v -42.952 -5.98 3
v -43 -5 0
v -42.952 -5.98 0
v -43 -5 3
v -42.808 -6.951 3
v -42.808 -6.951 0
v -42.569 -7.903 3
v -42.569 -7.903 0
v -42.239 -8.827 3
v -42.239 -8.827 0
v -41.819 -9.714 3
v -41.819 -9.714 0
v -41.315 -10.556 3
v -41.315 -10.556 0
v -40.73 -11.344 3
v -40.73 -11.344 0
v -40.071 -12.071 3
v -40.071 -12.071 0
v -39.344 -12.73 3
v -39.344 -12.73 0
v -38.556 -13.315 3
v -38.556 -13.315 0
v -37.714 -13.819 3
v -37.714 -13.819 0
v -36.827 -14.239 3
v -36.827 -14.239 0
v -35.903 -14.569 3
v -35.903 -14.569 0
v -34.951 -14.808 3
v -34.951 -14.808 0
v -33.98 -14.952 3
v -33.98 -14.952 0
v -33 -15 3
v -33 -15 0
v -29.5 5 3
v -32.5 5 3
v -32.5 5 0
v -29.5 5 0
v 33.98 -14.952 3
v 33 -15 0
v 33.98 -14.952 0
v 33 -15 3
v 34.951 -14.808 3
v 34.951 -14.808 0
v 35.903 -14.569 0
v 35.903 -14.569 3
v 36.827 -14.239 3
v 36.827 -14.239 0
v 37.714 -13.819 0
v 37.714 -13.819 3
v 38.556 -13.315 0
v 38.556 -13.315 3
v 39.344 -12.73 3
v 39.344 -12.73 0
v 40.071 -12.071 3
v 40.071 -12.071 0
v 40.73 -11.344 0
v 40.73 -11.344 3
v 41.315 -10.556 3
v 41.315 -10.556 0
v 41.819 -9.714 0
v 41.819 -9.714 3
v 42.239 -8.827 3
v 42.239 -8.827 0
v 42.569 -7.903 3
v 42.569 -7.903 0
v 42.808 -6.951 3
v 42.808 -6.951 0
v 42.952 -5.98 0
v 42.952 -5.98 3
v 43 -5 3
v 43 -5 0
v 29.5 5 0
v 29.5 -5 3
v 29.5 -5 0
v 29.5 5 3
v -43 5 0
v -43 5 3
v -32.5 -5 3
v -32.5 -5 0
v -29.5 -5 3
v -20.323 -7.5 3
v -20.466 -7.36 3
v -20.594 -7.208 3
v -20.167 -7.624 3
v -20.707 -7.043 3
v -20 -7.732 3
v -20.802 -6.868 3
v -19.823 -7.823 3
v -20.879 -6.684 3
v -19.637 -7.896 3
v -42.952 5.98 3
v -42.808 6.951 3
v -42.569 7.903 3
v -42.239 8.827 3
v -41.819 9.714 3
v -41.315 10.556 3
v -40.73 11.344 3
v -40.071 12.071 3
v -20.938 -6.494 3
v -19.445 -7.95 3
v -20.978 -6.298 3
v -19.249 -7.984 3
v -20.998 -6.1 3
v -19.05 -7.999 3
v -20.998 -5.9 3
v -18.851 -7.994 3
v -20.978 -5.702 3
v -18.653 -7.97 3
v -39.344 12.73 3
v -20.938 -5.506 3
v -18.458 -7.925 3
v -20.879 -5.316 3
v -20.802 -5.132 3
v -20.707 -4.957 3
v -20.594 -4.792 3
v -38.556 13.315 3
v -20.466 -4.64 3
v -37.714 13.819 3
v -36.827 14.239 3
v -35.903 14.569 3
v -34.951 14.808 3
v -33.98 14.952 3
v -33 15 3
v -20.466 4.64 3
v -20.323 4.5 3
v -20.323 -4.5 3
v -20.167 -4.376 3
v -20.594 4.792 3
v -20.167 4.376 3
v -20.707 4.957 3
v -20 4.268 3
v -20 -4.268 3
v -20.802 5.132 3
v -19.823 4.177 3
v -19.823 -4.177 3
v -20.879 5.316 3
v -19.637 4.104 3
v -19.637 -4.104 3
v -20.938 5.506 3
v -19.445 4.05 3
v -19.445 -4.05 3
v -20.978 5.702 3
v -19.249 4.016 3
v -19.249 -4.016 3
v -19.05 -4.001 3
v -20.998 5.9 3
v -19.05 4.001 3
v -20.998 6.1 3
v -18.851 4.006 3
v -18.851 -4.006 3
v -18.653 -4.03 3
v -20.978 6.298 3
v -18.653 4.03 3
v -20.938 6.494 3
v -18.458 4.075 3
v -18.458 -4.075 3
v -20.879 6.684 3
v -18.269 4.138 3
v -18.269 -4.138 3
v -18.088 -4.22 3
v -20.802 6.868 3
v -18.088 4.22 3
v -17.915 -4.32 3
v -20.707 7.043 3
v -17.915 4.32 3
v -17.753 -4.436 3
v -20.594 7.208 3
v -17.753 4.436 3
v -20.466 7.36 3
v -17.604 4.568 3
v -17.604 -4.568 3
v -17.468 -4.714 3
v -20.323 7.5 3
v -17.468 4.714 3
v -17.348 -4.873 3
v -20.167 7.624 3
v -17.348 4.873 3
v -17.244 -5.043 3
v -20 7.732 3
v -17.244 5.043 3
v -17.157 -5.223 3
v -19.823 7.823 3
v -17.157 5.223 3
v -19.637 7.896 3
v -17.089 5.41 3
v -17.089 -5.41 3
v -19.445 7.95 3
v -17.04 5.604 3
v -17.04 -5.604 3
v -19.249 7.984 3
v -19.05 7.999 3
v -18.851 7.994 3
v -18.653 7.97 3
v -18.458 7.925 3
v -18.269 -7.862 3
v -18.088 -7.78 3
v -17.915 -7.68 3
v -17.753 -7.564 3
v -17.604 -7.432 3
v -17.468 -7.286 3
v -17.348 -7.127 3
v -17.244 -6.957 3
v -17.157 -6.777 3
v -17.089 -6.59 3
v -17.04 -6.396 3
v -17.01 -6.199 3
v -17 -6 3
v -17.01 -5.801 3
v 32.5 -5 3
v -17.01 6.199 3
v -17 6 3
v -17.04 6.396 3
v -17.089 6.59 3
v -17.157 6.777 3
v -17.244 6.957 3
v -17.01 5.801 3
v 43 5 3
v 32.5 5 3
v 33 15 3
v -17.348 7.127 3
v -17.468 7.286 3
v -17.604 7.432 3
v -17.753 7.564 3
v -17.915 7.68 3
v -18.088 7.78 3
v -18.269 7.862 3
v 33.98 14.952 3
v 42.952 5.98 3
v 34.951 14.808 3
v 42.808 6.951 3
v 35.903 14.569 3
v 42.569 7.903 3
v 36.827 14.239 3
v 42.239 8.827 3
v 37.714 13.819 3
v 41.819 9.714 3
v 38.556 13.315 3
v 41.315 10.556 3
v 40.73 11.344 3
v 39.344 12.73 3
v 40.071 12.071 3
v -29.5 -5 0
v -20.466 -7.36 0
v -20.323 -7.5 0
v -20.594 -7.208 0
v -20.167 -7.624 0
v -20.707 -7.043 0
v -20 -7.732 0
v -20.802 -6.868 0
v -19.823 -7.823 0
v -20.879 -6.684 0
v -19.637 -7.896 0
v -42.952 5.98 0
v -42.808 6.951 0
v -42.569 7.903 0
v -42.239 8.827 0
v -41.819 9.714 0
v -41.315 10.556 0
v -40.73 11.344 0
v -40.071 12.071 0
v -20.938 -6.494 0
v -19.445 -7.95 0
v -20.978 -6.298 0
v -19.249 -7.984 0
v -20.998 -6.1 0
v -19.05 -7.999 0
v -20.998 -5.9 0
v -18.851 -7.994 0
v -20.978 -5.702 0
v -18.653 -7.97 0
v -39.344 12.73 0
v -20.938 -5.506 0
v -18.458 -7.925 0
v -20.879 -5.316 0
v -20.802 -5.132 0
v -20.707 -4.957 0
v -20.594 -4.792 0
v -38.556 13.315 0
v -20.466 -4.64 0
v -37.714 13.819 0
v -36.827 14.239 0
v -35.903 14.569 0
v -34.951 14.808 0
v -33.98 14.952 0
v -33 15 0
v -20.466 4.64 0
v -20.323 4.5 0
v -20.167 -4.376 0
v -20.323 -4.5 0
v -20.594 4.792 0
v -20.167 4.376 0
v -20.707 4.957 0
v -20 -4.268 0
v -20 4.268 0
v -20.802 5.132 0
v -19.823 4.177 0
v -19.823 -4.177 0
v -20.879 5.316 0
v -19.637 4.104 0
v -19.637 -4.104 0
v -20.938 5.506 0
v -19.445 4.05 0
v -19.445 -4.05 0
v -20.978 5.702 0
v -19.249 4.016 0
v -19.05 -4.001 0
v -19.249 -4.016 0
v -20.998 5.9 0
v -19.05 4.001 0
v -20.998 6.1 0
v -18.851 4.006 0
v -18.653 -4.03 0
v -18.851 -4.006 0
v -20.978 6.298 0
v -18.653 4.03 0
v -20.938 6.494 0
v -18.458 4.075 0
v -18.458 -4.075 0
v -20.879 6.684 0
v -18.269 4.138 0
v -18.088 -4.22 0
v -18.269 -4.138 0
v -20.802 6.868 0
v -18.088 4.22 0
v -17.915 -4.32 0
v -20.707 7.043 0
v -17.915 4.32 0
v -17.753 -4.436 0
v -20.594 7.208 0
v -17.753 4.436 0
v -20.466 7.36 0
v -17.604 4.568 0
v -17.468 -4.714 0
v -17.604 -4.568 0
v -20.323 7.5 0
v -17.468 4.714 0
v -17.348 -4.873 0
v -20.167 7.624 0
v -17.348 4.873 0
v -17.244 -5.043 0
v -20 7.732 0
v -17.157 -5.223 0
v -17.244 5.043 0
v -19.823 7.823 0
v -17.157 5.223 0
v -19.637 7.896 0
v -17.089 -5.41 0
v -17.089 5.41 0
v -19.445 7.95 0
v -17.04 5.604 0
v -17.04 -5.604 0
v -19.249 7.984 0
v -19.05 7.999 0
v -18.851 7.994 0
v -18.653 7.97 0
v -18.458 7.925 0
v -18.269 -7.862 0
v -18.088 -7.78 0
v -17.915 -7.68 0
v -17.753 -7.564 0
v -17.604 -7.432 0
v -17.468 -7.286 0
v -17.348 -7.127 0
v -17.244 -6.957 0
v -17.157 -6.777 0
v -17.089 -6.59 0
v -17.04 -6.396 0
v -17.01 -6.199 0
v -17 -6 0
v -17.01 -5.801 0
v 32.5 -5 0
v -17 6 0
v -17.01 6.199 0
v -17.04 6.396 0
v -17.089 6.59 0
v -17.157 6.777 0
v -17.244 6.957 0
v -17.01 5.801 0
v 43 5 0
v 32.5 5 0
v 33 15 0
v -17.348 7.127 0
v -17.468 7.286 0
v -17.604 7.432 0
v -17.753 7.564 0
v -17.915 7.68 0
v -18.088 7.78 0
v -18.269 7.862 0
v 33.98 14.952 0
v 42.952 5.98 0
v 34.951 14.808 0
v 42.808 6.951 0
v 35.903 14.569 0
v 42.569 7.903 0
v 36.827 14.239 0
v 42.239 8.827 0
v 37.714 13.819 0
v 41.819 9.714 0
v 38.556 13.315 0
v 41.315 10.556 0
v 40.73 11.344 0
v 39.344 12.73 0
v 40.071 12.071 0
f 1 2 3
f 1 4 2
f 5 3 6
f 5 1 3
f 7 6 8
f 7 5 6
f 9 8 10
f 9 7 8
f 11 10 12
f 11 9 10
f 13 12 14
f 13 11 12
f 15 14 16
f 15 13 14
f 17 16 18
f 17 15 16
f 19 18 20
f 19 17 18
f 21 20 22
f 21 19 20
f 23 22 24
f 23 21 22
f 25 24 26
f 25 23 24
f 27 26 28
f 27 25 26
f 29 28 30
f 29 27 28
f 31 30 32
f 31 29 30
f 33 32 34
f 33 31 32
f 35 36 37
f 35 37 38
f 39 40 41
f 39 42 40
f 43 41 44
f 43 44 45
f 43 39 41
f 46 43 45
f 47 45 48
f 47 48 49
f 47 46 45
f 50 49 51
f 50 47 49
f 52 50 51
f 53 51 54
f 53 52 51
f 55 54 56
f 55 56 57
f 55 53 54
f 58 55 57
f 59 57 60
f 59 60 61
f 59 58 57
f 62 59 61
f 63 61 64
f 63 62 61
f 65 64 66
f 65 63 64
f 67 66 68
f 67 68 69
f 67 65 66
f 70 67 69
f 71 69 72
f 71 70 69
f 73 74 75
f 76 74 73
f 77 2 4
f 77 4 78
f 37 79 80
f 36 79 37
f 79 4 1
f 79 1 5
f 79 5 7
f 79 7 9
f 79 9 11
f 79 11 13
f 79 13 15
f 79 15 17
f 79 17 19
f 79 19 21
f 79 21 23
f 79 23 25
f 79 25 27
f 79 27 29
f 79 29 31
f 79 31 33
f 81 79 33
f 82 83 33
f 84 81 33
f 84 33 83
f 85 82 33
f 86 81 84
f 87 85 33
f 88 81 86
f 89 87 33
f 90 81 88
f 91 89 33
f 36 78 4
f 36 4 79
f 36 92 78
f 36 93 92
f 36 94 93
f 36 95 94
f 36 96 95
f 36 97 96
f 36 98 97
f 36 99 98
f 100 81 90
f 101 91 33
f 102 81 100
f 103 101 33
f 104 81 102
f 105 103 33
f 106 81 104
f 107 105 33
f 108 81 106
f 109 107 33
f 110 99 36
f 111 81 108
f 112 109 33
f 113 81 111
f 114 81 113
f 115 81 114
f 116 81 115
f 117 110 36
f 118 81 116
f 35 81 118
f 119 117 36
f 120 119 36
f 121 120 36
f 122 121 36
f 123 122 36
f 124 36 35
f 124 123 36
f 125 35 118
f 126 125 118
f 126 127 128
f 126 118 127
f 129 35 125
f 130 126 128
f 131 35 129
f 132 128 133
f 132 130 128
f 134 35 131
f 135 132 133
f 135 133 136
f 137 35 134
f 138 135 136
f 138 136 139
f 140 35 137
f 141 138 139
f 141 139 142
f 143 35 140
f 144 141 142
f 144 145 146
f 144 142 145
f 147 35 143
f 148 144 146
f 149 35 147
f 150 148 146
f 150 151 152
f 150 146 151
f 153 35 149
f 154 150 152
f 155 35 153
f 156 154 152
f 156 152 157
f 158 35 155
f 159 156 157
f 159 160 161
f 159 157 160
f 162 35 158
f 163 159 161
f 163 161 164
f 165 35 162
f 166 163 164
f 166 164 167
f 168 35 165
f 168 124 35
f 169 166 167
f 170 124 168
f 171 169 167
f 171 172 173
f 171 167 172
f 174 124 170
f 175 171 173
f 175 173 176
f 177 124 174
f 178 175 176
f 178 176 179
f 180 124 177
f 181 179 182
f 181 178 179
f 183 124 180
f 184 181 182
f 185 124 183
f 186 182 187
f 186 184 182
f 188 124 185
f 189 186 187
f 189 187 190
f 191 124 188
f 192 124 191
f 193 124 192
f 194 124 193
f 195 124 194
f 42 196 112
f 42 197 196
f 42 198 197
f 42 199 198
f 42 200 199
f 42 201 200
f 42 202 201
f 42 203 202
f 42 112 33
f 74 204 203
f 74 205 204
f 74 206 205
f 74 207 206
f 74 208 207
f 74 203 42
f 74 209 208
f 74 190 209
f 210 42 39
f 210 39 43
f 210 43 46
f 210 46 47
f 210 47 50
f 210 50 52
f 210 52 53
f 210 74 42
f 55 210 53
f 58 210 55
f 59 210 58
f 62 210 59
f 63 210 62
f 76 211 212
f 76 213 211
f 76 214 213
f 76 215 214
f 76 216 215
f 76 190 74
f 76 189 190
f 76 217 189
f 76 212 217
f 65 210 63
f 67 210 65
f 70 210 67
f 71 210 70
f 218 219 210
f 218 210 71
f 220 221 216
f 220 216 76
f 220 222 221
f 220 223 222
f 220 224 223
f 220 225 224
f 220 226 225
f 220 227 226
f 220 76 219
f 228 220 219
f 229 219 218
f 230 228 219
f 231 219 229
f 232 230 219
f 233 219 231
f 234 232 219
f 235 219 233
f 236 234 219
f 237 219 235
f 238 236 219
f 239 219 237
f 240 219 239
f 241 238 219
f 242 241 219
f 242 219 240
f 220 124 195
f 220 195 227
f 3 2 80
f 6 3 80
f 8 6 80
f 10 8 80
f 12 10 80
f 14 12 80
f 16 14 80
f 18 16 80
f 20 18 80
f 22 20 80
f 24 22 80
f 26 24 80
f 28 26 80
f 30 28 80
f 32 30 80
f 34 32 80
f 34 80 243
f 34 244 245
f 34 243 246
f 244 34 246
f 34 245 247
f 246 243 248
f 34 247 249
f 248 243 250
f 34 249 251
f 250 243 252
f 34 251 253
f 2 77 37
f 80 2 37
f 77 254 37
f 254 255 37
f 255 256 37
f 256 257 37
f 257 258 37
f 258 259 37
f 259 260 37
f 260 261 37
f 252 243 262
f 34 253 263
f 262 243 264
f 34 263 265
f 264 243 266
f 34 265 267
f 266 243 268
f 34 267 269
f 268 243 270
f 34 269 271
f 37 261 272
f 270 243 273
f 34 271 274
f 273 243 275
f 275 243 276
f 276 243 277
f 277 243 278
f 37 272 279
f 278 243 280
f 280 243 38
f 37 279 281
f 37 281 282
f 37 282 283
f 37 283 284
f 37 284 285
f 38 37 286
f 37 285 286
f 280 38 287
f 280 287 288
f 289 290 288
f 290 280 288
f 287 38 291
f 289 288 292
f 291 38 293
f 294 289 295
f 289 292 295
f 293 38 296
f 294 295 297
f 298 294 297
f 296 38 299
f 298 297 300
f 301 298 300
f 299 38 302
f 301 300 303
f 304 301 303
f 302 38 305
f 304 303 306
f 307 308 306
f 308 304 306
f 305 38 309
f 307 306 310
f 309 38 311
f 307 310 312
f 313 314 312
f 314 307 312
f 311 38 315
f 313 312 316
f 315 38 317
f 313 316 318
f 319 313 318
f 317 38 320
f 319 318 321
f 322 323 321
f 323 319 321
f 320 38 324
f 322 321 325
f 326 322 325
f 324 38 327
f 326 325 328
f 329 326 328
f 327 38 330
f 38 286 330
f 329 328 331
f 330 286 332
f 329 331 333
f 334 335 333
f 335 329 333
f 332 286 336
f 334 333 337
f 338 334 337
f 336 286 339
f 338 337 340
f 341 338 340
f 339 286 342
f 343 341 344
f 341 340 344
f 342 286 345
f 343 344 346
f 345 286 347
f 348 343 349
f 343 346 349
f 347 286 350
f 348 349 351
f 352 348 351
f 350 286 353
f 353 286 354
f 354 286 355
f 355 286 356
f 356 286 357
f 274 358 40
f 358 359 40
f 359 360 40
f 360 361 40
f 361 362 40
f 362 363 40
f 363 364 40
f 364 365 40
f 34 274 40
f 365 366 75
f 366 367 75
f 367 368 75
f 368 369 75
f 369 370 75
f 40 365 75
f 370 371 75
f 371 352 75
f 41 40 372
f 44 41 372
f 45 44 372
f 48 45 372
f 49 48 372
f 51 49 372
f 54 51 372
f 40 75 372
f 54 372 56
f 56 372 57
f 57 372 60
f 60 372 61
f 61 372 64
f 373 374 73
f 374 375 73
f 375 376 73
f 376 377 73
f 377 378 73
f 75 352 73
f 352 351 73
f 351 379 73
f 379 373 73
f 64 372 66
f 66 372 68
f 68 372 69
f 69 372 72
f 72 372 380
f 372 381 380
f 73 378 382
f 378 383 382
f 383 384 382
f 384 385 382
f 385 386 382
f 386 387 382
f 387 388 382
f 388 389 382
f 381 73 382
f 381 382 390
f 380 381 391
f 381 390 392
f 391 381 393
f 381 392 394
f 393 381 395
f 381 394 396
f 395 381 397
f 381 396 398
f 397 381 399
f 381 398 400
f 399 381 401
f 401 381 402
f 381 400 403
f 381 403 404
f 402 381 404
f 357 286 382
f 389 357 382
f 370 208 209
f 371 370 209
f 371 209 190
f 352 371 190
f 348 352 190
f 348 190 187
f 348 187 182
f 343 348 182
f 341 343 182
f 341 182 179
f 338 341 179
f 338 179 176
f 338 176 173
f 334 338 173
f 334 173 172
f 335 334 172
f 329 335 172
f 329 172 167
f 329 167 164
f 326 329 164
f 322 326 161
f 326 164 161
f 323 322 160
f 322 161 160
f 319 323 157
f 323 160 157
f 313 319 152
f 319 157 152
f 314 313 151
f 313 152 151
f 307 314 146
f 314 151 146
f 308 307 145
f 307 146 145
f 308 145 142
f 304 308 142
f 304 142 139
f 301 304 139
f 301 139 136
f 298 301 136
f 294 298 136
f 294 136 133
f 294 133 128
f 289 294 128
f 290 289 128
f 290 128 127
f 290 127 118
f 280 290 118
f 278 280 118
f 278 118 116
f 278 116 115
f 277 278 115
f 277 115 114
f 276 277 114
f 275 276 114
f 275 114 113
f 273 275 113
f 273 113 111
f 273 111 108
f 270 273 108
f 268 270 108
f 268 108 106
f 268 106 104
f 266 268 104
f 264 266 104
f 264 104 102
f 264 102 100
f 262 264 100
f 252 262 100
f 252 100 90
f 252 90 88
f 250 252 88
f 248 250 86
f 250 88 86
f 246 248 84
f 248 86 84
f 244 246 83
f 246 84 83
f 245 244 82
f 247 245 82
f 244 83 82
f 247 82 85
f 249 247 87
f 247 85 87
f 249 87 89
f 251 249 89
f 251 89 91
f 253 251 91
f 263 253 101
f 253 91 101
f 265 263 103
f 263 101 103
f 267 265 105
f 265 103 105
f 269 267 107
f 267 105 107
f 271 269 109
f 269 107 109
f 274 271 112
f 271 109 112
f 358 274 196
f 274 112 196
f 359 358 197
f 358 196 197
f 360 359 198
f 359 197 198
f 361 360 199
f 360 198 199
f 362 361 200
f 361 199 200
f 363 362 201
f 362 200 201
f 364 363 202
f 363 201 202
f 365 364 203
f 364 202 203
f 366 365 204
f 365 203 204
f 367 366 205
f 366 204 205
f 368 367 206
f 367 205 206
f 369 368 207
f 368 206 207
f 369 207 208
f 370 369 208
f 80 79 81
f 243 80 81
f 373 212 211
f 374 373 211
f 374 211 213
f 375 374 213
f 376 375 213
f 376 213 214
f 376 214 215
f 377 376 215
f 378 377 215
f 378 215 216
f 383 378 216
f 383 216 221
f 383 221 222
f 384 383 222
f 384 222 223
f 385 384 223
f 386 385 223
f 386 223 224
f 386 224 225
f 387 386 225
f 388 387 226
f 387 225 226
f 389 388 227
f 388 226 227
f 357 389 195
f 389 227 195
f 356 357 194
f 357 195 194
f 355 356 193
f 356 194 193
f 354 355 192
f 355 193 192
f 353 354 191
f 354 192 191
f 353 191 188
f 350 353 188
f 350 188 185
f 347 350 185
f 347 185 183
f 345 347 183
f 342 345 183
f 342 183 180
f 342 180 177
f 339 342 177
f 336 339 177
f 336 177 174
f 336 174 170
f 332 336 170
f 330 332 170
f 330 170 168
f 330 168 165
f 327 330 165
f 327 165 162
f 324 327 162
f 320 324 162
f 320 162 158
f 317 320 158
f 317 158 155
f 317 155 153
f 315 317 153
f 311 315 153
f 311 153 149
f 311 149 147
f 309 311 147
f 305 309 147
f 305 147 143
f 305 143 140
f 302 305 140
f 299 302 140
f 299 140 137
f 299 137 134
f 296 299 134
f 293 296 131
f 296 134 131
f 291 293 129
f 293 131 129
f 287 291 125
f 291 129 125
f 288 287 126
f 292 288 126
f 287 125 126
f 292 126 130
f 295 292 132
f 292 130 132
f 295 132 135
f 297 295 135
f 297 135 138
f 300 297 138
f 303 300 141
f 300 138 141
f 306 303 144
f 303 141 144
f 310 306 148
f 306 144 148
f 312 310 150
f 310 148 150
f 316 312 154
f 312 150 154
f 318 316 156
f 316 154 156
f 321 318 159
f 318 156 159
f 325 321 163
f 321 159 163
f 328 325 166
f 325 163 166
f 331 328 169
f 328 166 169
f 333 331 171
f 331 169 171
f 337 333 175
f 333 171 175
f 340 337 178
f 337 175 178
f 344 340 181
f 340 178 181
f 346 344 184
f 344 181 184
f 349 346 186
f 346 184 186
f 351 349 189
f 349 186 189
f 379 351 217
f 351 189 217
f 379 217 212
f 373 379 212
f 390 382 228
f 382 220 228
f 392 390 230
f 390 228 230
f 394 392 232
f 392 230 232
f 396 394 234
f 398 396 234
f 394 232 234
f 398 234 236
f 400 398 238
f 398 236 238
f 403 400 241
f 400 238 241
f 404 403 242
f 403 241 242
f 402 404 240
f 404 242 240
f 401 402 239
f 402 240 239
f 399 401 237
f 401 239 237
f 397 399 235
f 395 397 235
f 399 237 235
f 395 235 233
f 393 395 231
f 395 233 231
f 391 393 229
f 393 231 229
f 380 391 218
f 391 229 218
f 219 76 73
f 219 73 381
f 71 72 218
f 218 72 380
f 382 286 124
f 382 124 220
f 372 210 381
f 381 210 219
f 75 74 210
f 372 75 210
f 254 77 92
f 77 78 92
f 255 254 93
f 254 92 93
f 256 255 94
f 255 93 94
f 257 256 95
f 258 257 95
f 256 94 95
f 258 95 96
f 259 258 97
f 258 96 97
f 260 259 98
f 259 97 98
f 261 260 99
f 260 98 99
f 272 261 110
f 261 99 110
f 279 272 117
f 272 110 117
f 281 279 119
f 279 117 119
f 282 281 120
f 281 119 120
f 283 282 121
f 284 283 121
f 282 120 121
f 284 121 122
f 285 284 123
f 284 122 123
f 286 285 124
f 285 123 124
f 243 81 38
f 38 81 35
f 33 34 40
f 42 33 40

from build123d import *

# Parameters (mm, degrees)
CROQUIS1_W              = 86
CROQUIS1_H              = 30
SALIENTE_EXTRUIR1_DEPTH = 3
CORTAR_EXTRUIR1_REACH   = 5
CROQUIS2_R              = 2
CROQUIS2_W              = 3
CROQUIS2_H              = 10
REDONDEO1_R             = 10


with BuildPart() as part:
    # Croquis1 → Saliente-Extruir1 (new body)
    with BuildSketch(Plane.XY):
        Rectangle(CROQUIS1_W, CROQUIS1_H)
    extrude(amount=SALIENTE_EXTRUIR1_DEPTH)

    # Croquis2 → Cortar-Extruir1 (cut, up to next)
    with BuildSketch(Plane.XY.offset(3), mode=Mode.PRIVATE) as cortar_extruir1_sk1:
        with Locations((-19, 6)):
            Circle(CROQUIS2_R)
    cortar_extruir1_tool1 = extrude(cortar_extruir1_sk1.sketch, amount=-CORTAR_EXTRUIR1_REACH, mode=Mode.PRIVATE) & part.part
    add(cortar_extruir1_tool1.solids().sort_by_distance((-19, 6, 3))[0], mode=Mode.SUBTRACT)
    # Croquis2 → Cortar-Extruir1 (cut, up to next)
    with BuildSketch(Plane.XY.offset(3), mode=Mode.PRIVATE) as cortar_extruir1_sk2:
        with Locations((-19, -6)):
            Circle(CROQUIS2_R)
    cortar_extruir1_tool2 = extrude(cortar_extruir1_sk2.sketch, amount=-CORTAR_EXTRUIR1_REACH, mode=Mode.PRIVATE) & part.part
    add(cortar_extruir1_tool2.solids().sort_by_distance((-19, -6, 3))[0], mode=Mode.SUBTRACT)
    # Croquis2 → Cortar-Extruir1 (cut, up to next)
    with BuildSketch(Plane.XY.offset(3), mode=Mode.PRIVATE) as cortar_extruir1_sk3:
        with Locations((-31, 0)):
            Rectangle(CROQUIS2_W, CROQUIS2_H)
    cortar_extruir1_tool3 = extrude(cortar_extruir1_sk3.sketch, amount=-CORTAR_EXTRUIR1_REACH, mode=Mode.PRIVATE) & part.part
    add(cortar_extruir1_tool3.solids().sort_by_distance((-31, 0, 3))[0], mode=Mode.SUBTRACT)
    # Croquis2 → Cortar-Extruir1 (cut, up to next)
    with BuildSketch(Plane.XY.offset(3), mode=Mode.PRIVATE) as cortar_extruir1_sk4:
        with Locations((31, 0)):
            Rectangle(CROQUIS2_W, CROQUIS2_H)
    cortar_extruir1_tool4 = extrude(cortar_extruir1_sk4.sketch, amount=-CORTAR_EXTRUIR1_REACH, mode=Mode.PRIVATE) & part.part
    add(cortar_extruir1_tool4.solids().sort_by_distance((31, 0, 3))[0], mode=Mode.SUBTRACT)

    # Redondeo1
    redondeo1_edges = [part.edges().sort_by_distance(p)[0] for p in [
        (43, -15, 1.5),
        (-43, -15, 1.5),
        (-43, 15, 1.5),
        (43, 15, 1.5),
    ]]
    fillet(redondeo1_edges, radius=REDONDEO1_R)


solid = part.part
